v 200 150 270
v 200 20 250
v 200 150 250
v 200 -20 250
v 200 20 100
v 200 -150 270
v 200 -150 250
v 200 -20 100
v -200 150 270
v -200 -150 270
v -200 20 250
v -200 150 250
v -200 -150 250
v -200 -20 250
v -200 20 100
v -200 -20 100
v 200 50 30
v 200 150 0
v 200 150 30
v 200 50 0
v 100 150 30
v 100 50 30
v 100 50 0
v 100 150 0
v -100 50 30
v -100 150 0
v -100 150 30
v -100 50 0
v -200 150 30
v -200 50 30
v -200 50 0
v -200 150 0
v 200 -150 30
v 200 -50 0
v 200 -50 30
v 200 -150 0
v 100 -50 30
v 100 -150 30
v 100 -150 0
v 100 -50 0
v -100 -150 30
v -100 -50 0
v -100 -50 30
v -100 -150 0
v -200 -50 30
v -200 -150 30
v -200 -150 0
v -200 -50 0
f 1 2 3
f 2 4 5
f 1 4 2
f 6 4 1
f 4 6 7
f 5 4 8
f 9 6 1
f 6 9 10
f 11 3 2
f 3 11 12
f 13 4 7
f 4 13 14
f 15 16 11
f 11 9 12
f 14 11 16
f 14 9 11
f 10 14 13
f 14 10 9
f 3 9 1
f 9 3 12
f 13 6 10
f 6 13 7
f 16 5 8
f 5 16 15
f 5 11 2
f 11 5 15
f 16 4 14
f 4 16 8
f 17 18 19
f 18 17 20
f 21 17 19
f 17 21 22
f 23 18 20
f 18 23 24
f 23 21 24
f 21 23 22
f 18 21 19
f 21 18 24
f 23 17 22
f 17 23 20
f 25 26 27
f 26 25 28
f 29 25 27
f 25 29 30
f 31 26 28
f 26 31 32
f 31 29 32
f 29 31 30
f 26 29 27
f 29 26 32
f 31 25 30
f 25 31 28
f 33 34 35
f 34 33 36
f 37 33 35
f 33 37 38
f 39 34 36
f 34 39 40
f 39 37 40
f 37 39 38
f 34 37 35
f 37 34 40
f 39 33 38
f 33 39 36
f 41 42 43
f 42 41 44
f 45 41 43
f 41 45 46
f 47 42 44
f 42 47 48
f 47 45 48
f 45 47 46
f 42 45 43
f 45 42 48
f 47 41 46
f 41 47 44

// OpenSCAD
seat_width = 400;
seat_depth = 300;
seat_thickness = 20;
back_height = 150;
back_thickness = 40;
leg_thickness = 30;
leg_length = 100;

union() {
    // Seat
    translate([0, 0, leg_length + back_height + seat_thickness/2])
        cube([seat_width, seat_depth, seat_thickness], center = true);

    // Backrest
    translate([0, 0, leg_length + back_height/2])
        cube([seat_width, back_thickness, back_height], center = true);

    // Legs
    translate([seat_width/2 - leg_length/2, seat_depth/2 - leg_length/2, leg_thickness/2])
        cube([leg_length, leg_length, leg_thickness], center = true);
    translate([-seat_width/2 + leg_length/2, seat_depth/2 - leg_length/2, leg_thickness/2])
        cube([leg_length, leg_length, leg_thickness], center = true);
    translate([seat_width/2 - leg_length/2, -seat_depth/2 + leg_length/2, leg_thickness/2])
        cube([leg_length, leg_length, leg_thickness], center = true);
    translate([-seat_width/2 + leg_length/2, -seat_depth/2 + leg_length/2, leg_thickness/2])
        cube([leg_length, leg_length, leg_thickness], center = true);
}
